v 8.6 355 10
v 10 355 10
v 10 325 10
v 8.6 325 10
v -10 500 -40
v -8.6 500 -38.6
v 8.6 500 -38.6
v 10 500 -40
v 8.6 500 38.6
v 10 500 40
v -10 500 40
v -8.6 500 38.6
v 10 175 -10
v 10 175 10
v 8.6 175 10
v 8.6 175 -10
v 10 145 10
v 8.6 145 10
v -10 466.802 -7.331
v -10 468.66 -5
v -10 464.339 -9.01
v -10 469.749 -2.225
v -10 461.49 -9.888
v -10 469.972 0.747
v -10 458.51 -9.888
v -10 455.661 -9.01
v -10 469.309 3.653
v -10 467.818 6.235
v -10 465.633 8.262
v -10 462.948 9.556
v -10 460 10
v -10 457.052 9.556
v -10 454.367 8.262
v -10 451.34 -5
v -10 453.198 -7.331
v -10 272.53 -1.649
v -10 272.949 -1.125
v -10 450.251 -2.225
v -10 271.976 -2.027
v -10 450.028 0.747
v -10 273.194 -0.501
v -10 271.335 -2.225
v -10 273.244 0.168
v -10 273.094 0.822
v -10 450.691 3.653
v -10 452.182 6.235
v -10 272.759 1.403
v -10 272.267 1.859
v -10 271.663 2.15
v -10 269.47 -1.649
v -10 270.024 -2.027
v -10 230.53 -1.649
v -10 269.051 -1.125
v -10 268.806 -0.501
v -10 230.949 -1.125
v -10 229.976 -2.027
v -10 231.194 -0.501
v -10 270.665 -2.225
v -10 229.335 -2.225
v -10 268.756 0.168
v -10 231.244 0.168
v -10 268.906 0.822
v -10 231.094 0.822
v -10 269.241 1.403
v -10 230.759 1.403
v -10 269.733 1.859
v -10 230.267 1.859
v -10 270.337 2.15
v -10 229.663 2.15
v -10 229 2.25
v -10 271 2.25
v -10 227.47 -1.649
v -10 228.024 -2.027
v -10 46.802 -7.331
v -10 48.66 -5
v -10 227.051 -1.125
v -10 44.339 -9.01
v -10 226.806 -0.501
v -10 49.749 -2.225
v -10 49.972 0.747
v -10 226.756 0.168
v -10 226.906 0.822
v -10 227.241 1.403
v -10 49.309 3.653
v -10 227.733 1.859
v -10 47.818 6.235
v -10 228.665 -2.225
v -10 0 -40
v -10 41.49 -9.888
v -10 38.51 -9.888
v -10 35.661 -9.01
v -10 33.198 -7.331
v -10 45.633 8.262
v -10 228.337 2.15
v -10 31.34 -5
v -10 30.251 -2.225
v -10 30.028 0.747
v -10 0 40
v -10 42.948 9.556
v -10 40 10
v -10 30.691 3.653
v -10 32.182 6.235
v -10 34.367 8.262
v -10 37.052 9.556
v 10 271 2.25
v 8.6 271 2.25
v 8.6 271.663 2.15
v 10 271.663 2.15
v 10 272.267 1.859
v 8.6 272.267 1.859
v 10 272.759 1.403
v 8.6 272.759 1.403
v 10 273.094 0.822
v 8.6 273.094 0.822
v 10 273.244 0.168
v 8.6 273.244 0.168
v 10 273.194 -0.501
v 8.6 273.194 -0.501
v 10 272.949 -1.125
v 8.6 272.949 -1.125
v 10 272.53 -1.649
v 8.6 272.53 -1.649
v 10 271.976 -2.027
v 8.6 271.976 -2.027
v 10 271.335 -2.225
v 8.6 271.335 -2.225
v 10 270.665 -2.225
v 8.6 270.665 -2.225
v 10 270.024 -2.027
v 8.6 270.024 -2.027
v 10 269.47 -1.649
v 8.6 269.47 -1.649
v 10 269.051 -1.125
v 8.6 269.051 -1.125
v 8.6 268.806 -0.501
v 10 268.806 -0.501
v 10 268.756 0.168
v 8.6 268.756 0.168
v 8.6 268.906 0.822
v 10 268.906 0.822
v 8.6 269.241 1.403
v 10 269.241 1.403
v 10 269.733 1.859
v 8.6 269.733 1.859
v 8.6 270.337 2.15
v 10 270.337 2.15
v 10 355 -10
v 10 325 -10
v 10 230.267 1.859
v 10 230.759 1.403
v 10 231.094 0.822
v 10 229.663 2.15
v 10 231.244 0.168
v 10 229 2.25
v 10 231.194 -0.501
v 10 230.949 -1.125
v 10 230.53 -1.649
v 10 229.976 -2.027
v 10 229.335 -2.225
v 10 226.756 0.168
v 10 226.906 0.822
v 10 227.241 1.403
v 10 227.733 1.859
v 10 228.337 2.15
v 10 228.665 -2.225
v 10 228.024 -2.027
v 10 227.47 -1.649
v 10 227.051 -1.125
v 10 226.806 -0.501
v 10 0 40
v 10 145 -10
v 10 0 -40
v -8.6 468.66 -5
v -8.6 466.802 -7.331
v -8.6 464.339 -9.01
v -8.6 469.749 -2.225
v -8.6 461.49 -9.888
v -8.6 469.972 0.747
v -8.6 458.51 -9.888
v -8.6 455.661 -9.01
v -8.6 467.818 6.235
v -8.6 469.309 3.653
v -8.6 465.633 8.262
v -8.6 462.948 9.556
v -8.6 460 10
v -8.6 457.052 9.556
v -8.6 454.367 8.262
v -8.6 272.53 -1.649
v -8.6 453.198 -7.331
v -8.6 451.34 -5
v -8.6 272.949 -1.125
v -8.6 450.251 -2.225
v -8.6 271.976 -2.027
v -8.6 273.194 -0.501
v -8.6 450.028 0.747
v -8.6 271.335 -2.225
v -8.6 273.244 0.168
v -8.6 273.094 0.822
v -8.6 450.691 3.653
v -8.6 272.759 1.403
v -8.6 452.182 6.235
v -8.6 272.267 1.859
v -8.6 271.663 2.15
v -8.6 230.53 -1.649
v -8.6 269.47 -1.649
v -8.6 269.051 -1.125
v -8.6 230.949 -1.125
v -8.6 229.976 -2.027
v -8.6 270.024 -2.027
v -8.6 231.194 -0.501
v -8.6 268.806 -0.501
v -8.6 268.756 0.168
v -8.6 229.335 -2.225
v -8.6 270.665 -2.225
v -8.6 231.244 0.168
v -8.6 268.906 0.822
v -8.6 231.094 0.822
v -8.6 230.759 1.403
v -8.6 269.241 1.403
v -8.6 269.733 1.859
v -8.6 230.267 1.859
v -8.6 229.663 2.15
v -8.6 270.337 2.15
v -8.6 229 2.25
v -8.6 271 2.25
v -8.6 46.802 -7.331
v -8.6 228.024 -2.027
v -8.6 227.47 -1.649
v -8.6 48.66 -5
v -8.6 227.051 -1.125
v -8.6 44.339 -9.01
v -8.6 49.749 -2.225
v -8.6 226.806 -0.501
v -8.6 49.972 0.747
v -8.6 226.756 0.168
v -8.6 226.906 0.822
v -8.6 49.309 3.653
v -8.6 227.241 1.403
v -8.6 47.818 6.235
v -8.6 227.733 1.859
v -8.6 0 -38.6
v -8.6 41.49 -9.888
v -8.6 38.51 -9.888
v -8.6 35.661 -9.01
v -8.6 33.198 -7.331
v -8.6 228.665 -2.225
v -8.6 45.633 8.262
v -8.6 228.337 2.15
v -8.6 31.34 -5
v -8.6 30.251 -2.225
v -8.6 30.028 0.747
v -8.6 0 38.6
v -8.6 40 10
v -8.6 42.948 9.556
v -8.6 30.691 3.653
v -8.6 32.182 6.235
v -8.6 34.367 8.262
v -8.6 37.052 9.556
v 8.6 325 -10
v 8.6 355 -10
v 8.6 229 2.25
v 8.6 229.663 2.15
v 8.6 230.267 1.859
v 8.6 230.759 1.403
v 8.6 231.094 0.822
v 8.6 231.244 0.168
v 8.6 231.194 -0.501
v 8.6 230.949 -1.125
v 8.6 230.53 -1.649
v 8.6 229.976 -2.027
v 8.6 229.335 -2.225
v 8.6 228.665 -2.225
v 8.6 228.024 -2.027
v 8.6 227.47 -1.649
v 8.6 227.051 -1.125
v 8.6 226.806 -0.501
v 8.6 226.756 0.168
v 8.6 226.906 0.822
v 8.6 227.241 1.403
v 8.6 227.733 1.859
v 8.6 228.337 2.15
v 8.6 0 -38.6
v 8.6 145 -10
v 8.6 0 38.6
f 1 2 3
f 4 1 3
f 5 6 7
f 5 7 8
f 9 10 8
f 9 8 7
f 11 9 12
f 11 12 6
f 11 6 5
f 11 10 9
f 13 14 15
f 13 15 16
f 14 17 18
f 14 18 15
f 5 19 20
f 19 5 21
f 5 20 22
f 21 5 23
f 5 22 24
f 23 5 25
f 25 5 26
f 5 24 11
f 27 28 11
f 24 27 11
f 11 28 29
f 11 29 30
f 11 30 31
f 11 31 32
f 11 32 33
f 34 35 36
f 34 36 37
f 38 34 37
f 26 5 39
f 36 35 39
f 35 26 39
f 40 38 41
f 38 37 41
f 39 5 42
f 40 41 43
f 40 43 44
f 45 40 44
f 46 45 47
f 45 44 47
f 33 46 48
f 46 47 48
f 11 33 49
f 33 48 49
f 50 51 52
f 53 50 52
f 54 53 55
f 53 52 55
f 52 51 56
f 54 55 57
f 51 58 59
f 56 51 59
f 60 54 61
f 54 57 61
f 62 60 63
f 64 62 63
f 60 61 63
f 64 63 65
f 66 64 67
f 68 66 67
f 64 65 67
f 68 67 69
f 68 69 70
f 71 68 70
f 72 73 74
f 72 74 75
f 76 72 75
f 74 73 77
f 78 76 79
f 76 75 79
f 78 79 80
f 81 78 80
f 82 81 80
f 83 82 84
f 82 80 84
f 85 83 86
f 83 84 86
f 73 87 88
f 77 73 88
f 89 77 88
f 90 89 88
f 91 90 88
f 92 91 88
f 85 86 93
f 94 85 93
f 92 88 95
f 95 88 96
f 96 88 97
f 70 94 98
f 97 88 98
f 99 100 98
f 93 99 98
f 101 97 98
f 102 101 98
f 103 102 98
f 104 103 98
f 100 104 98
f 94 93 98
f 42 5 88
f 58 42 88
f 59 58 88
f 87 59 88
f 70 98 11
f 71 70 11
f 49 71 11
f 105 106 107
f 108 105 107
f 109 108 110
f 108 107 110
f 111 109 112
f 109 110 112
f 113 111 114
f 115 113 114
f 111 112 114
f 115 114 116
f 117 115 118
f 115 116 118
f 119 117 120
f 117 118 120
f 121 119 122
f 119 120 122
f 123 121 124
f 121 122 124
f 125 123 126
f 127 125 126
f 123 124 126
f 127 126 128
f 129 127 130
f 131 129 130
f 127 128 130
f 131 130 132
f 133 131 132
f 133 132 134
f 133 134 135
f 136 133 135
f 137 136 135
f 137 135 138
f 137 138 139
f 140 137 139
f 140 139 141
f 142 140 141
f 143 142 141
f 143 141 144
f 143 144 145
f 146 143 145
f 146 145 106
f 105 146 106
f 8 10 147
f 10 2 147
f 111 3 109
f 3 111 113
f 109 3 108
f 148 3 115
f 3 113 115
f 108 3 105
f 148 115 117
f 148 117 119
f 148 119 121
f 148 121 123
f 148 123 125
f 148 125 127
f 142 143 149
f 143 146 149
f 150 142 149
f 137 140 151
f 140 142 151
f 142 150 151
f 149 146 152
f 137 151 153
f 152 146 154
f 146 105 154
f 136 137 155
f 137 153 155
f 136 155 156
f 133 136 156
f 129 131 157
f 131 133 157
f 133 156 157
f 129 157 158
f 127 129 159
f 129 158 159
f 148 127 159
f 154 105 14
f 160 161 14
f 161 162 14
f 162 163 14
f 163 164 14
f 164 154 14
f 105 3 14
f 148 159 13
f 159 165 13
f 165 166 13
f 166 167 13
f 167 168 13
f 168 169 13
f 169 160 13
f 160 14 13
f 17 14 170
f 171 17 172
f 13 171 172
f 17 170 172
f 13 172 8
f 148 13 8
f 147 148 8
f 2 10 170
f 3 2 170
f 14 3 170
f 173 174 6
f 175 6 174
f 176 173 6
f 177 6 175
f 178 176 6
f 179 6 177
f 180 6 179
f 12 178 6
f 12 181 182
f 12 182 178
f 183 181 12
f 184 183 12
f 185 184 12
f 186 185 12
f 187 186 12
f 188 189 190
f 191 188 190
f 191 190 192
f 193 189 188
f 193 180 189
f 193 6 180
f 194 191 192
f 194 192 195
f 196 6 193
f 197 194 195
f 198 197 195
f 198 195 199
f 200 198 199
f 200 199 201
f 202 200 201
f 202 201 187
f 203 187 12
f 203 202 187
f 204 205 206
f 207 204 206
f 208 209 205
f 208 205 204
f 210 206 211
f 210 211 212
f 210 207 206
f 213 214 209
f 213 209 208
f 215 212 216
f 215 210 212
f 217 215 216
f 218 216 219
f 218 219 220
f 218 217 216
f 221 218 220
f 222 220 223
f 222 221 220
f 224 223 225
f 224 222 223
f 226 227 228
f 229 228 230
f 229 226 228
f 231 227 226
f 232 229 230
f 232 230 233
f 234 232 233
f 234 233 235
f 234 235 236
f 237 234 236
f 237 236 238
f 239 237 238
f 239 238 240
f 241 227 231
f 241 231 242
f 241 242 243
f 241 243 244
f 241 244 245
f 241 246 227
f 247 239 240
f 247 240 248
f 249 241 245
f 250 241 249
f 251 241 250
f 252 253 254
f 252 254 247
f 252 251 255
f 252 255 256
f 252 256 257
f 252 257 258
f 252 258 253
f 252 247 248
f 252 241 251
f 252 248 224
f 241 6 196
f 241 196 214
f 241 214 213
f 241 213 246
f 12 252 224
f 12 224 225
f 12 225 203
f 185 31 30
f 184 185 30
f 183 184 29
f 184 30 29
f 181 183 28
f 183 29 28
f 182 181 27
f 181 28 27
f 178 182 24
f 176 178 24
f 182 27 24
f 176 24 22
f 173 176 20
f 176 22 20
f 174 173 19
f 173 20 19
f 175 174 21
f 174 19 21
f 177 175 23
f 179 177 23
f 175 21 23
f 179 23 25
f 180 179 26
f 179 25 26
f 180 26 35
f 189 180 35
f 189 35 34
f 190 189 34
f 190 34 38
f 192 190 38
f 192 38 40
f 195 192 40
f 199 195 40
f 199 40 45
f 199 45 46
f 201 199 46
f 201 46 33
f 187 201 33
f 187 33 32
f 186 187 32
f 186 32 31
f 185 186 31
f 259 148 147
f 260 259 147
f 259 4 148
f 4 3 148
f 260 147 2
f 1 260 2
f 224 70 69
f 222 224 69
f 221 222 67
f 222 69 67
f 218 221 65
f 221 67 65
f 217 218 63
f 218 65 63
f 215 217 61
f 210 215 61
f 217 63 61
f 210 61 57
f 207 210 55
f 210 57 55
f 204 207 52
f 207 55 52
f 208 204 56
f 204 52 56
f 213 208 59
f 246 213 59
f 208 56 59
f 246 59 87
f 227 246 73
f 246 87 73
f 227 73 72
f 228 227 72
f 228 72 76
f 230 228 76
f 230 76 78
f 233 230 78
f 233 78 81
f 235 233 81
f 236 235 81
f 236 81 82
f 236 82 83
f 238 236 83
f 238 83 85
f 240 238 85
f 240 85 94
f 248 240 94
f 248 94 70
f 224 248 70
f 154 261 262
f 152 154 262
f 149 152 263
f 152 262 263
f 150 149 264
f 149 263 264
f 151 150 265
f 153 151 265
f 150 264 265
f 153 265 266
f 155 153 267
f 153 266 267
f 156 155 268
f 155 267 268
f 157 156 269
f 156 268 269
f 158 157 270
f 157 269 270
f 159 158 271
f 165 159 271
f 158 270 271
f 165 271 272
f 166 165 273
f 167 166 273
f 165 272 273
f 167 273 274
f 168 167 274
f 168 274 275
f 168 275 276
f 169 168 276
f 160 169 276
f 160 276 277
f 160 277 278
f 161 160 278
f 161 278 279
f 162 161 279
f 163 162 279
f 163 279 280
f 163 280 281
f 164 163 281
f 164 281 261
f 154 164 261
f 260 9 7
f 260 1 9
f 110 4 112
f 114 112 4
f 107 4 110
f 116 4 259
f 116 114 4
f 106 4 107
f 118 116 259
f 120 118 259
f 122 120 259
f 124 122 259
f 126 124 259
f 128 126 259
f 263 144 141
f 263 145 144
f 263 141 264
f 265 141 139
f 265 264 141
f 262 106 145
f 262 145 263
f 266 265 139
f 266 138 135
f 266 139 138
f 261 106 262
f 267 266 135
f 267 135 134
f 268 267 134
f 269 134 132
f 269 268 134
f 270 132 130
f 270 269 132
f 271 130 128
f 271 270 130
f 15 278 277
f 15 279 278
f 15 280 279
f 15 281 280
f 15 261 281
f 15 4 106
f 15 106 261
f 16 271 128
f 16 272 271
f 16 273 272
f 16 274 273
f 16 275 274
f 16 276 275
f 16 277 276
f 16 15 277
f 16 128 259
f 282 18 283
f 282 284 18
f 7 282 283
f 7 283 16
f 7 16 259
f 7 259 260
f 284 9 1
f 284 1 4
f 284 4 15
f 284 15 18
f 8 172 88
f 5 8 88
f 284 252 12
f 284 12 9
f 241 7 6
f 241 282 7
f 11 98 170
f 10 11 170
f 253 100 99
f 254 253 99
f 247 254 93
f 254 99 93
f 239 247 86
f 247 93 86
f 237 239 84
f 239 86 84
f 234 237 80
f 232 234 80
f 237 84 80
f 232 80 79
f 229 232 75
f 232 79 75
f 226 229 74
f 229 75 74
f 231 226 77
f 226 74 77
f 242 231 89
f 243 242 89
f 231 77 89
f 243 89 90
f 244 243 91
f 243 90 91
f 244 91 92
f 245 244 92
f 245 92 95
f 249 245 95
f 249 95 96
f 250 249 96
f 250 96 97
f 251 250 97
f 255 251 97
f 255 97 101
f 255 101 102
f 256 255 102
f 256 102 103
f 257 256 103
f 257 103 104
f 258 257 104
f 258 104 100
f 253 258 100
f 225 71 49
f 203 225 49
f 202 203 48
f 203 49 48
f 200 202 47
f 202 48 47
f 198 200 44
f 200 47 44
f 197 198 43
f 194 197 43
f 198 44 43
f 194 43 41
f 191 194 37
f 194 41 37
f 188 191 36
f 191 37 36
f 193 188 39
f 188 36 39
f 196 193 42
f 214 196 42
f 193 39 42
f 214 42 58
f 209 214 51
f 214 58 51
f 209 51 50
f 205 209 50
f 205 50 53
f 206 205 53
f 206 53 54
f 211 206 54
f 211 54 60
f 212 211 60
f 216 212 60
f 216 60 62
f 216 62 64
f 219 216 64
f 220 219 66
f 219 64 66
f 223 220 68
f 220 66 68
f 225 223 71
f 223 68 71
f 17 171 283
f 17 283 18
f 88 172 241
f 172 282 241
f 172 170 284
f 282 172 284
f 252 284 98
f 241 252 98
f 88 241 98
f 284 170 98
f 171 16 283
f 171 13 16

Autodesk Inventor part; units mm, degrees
ref_plane "YZ Plane" through (0, 0, 0) normal (1, 0, 0) x (0, 1, 0)
ref_plane "XZ Plane" through (0, 0, 0) normal (0, 1, 0) x (-1, 0, 0)
ref_plane "XY Plane" through (0, 0, 0) normal (0, 0, 1) x (1, 0, 0)
sketch "Szkic2" plane through (0, 0, 0) normal (0, 1, 0) x (-1, 0, 0)
  line L0 (10, 40) -> (-10, 40)
  line L1 (-10, 40) -> (-10, -40)
  line L2 (-10, -40) -> (10, -40)
  line L3 (10, -40) -> (10, 40)
  line L4 (10, 40) -> (-10, -40) construction
  line L5 (-10, 40) -> (10, -40) construction
  line L6 (8.6, 38.6) -> (-8.6, 38.6)
  line L7 (-8.6, 38.6) -> (-8.6, -38.6)
  line L8 (-8.6, -38.6) -> (8.6, -38.6)
  line L9 (8.6, -38.6) -> (8.6, 38.6)
  line L10 (8.6, 38.6) -> (-8.6, -38.6) construction
  line L11 (-8.6, 38.6) -> (8.6, -38.6) construction
  point P0 (0, 0)
  point P1 (0, -40)
  dimension "d14" = 20
  dimension "d15" = 80
  dimension "d16" = 1.4
  dimension "d17" = 1.4
extrude "Wyciągnięcie proste2" add sketch "Szkic2" along normal blind 500
sketch "Szkic3" plane through (-10, 0, -40) normal (-1, 0, 0) x (0, 0, 1)
  circle A0 centre (40, 229) radius 2.25
  circle A1 centre (40, 271) radius 2.25
  line L0 (0, 0) -> (0, 500) projected
  line L1 (0, 500) -> (80, 500) projected
  point P0 (40, 0)
  point P1 (40, 250)
  point P2 (40, 500)
  dimension "d20" = 4.5
  dimension "d21" = 4.5
  dimension "d22" = 21
  dimension "d23" = 21
  dimension "d24" = 40
  dimension "d25" = 40
  dimension "d26" = 40
  dimension "d27" = 250
extrude "Wyciągnięcie proste3" cut sketch "Szkic3" against normal blind 20
sketch "Szkic4" plane through (-10, 0, -40) normal (-1, 0, 0) x (0, 0, 1)
  point P0 (40, 0)
sketch "Szkic5" plane through (10, 0, 40) normal (1, 0, 0) x (0, 0, -1)
  point P0 (40, 0)
sketch "Szkic6" plane through (10, 0, 40) normal (1, 0, 0) x (0, 0, -1)
  point P0 (40, 0)
sketch "Szkic7" plane through (10, 0, 40) normal (1, 0, 0) x (0, 0, -1)
  line L0 (80, 0) -> (80, 500) projected
  line L1 (80, 250) -> (0, 250)
  line L2 (1.4, 0) -> (1.4, 500) projected
  line L3 (80, 250) -> (160, 250) construction
  line L4 (50, 355) -> (30, 355)
  line L5 (30, 355) -> (30, 325)
  line L6 (30, 325) -> (50, 325)
  line L7 (50, 325) -> (50, 355)
  line L8 (50, 355) -> (30, 325) construction
  line L9 (30, 355) -> (50, 325) construction
  line L10 (50, 145) -> (30, 145)
  line L11 (30, 145) -> (30, 175)
  line L12 (30, 175) -> (50, 175)
  line L13 (50, 175) -> (50, 145)
  point P0 (40, 0)
  point P1 (40, 340)
  dimension "d30" = 80
  dimension "d31" = 180
  dimension "d32" = 20
  dimension "d33" = 30
  dimension "d34" = 90
  dimension "d35" = 40
extrude "Wyciągnięcie proste4" cut sketch "Szkic7" against normal blind 1.4
sketch "Szkic8" plane through (-10, 0, -40) normal (-1, 0, 0) x (0, 0, 1)
  line L0 (0, 0) -> (0, 500) projected
  line L1 (0, 250) -> (80, 250)
  line L2 (80, 0) -> (80, 500) projected
  line L3 (0, 250) -> (80, 250) construction
  circle A0 centre (40, 40) radius 10
  line L4 (0, 0) -> (80, 0) projected
  circle A1 centre (40, 460) radius 10
  point P0 (40, 0)
  point P1 (40, 0)
  dimension "d38" = 80
  dimension "d39" = 0
  dimension "d40" = 20
  dimension "d41" = 40
  dimension "d42" = 40
extrude "Wyciągnięcie proste5" cut sketch "Szkic8" against normal blind 1.4 contours A0 | A1
properties part number "belka" material "Aluminium 6061"
